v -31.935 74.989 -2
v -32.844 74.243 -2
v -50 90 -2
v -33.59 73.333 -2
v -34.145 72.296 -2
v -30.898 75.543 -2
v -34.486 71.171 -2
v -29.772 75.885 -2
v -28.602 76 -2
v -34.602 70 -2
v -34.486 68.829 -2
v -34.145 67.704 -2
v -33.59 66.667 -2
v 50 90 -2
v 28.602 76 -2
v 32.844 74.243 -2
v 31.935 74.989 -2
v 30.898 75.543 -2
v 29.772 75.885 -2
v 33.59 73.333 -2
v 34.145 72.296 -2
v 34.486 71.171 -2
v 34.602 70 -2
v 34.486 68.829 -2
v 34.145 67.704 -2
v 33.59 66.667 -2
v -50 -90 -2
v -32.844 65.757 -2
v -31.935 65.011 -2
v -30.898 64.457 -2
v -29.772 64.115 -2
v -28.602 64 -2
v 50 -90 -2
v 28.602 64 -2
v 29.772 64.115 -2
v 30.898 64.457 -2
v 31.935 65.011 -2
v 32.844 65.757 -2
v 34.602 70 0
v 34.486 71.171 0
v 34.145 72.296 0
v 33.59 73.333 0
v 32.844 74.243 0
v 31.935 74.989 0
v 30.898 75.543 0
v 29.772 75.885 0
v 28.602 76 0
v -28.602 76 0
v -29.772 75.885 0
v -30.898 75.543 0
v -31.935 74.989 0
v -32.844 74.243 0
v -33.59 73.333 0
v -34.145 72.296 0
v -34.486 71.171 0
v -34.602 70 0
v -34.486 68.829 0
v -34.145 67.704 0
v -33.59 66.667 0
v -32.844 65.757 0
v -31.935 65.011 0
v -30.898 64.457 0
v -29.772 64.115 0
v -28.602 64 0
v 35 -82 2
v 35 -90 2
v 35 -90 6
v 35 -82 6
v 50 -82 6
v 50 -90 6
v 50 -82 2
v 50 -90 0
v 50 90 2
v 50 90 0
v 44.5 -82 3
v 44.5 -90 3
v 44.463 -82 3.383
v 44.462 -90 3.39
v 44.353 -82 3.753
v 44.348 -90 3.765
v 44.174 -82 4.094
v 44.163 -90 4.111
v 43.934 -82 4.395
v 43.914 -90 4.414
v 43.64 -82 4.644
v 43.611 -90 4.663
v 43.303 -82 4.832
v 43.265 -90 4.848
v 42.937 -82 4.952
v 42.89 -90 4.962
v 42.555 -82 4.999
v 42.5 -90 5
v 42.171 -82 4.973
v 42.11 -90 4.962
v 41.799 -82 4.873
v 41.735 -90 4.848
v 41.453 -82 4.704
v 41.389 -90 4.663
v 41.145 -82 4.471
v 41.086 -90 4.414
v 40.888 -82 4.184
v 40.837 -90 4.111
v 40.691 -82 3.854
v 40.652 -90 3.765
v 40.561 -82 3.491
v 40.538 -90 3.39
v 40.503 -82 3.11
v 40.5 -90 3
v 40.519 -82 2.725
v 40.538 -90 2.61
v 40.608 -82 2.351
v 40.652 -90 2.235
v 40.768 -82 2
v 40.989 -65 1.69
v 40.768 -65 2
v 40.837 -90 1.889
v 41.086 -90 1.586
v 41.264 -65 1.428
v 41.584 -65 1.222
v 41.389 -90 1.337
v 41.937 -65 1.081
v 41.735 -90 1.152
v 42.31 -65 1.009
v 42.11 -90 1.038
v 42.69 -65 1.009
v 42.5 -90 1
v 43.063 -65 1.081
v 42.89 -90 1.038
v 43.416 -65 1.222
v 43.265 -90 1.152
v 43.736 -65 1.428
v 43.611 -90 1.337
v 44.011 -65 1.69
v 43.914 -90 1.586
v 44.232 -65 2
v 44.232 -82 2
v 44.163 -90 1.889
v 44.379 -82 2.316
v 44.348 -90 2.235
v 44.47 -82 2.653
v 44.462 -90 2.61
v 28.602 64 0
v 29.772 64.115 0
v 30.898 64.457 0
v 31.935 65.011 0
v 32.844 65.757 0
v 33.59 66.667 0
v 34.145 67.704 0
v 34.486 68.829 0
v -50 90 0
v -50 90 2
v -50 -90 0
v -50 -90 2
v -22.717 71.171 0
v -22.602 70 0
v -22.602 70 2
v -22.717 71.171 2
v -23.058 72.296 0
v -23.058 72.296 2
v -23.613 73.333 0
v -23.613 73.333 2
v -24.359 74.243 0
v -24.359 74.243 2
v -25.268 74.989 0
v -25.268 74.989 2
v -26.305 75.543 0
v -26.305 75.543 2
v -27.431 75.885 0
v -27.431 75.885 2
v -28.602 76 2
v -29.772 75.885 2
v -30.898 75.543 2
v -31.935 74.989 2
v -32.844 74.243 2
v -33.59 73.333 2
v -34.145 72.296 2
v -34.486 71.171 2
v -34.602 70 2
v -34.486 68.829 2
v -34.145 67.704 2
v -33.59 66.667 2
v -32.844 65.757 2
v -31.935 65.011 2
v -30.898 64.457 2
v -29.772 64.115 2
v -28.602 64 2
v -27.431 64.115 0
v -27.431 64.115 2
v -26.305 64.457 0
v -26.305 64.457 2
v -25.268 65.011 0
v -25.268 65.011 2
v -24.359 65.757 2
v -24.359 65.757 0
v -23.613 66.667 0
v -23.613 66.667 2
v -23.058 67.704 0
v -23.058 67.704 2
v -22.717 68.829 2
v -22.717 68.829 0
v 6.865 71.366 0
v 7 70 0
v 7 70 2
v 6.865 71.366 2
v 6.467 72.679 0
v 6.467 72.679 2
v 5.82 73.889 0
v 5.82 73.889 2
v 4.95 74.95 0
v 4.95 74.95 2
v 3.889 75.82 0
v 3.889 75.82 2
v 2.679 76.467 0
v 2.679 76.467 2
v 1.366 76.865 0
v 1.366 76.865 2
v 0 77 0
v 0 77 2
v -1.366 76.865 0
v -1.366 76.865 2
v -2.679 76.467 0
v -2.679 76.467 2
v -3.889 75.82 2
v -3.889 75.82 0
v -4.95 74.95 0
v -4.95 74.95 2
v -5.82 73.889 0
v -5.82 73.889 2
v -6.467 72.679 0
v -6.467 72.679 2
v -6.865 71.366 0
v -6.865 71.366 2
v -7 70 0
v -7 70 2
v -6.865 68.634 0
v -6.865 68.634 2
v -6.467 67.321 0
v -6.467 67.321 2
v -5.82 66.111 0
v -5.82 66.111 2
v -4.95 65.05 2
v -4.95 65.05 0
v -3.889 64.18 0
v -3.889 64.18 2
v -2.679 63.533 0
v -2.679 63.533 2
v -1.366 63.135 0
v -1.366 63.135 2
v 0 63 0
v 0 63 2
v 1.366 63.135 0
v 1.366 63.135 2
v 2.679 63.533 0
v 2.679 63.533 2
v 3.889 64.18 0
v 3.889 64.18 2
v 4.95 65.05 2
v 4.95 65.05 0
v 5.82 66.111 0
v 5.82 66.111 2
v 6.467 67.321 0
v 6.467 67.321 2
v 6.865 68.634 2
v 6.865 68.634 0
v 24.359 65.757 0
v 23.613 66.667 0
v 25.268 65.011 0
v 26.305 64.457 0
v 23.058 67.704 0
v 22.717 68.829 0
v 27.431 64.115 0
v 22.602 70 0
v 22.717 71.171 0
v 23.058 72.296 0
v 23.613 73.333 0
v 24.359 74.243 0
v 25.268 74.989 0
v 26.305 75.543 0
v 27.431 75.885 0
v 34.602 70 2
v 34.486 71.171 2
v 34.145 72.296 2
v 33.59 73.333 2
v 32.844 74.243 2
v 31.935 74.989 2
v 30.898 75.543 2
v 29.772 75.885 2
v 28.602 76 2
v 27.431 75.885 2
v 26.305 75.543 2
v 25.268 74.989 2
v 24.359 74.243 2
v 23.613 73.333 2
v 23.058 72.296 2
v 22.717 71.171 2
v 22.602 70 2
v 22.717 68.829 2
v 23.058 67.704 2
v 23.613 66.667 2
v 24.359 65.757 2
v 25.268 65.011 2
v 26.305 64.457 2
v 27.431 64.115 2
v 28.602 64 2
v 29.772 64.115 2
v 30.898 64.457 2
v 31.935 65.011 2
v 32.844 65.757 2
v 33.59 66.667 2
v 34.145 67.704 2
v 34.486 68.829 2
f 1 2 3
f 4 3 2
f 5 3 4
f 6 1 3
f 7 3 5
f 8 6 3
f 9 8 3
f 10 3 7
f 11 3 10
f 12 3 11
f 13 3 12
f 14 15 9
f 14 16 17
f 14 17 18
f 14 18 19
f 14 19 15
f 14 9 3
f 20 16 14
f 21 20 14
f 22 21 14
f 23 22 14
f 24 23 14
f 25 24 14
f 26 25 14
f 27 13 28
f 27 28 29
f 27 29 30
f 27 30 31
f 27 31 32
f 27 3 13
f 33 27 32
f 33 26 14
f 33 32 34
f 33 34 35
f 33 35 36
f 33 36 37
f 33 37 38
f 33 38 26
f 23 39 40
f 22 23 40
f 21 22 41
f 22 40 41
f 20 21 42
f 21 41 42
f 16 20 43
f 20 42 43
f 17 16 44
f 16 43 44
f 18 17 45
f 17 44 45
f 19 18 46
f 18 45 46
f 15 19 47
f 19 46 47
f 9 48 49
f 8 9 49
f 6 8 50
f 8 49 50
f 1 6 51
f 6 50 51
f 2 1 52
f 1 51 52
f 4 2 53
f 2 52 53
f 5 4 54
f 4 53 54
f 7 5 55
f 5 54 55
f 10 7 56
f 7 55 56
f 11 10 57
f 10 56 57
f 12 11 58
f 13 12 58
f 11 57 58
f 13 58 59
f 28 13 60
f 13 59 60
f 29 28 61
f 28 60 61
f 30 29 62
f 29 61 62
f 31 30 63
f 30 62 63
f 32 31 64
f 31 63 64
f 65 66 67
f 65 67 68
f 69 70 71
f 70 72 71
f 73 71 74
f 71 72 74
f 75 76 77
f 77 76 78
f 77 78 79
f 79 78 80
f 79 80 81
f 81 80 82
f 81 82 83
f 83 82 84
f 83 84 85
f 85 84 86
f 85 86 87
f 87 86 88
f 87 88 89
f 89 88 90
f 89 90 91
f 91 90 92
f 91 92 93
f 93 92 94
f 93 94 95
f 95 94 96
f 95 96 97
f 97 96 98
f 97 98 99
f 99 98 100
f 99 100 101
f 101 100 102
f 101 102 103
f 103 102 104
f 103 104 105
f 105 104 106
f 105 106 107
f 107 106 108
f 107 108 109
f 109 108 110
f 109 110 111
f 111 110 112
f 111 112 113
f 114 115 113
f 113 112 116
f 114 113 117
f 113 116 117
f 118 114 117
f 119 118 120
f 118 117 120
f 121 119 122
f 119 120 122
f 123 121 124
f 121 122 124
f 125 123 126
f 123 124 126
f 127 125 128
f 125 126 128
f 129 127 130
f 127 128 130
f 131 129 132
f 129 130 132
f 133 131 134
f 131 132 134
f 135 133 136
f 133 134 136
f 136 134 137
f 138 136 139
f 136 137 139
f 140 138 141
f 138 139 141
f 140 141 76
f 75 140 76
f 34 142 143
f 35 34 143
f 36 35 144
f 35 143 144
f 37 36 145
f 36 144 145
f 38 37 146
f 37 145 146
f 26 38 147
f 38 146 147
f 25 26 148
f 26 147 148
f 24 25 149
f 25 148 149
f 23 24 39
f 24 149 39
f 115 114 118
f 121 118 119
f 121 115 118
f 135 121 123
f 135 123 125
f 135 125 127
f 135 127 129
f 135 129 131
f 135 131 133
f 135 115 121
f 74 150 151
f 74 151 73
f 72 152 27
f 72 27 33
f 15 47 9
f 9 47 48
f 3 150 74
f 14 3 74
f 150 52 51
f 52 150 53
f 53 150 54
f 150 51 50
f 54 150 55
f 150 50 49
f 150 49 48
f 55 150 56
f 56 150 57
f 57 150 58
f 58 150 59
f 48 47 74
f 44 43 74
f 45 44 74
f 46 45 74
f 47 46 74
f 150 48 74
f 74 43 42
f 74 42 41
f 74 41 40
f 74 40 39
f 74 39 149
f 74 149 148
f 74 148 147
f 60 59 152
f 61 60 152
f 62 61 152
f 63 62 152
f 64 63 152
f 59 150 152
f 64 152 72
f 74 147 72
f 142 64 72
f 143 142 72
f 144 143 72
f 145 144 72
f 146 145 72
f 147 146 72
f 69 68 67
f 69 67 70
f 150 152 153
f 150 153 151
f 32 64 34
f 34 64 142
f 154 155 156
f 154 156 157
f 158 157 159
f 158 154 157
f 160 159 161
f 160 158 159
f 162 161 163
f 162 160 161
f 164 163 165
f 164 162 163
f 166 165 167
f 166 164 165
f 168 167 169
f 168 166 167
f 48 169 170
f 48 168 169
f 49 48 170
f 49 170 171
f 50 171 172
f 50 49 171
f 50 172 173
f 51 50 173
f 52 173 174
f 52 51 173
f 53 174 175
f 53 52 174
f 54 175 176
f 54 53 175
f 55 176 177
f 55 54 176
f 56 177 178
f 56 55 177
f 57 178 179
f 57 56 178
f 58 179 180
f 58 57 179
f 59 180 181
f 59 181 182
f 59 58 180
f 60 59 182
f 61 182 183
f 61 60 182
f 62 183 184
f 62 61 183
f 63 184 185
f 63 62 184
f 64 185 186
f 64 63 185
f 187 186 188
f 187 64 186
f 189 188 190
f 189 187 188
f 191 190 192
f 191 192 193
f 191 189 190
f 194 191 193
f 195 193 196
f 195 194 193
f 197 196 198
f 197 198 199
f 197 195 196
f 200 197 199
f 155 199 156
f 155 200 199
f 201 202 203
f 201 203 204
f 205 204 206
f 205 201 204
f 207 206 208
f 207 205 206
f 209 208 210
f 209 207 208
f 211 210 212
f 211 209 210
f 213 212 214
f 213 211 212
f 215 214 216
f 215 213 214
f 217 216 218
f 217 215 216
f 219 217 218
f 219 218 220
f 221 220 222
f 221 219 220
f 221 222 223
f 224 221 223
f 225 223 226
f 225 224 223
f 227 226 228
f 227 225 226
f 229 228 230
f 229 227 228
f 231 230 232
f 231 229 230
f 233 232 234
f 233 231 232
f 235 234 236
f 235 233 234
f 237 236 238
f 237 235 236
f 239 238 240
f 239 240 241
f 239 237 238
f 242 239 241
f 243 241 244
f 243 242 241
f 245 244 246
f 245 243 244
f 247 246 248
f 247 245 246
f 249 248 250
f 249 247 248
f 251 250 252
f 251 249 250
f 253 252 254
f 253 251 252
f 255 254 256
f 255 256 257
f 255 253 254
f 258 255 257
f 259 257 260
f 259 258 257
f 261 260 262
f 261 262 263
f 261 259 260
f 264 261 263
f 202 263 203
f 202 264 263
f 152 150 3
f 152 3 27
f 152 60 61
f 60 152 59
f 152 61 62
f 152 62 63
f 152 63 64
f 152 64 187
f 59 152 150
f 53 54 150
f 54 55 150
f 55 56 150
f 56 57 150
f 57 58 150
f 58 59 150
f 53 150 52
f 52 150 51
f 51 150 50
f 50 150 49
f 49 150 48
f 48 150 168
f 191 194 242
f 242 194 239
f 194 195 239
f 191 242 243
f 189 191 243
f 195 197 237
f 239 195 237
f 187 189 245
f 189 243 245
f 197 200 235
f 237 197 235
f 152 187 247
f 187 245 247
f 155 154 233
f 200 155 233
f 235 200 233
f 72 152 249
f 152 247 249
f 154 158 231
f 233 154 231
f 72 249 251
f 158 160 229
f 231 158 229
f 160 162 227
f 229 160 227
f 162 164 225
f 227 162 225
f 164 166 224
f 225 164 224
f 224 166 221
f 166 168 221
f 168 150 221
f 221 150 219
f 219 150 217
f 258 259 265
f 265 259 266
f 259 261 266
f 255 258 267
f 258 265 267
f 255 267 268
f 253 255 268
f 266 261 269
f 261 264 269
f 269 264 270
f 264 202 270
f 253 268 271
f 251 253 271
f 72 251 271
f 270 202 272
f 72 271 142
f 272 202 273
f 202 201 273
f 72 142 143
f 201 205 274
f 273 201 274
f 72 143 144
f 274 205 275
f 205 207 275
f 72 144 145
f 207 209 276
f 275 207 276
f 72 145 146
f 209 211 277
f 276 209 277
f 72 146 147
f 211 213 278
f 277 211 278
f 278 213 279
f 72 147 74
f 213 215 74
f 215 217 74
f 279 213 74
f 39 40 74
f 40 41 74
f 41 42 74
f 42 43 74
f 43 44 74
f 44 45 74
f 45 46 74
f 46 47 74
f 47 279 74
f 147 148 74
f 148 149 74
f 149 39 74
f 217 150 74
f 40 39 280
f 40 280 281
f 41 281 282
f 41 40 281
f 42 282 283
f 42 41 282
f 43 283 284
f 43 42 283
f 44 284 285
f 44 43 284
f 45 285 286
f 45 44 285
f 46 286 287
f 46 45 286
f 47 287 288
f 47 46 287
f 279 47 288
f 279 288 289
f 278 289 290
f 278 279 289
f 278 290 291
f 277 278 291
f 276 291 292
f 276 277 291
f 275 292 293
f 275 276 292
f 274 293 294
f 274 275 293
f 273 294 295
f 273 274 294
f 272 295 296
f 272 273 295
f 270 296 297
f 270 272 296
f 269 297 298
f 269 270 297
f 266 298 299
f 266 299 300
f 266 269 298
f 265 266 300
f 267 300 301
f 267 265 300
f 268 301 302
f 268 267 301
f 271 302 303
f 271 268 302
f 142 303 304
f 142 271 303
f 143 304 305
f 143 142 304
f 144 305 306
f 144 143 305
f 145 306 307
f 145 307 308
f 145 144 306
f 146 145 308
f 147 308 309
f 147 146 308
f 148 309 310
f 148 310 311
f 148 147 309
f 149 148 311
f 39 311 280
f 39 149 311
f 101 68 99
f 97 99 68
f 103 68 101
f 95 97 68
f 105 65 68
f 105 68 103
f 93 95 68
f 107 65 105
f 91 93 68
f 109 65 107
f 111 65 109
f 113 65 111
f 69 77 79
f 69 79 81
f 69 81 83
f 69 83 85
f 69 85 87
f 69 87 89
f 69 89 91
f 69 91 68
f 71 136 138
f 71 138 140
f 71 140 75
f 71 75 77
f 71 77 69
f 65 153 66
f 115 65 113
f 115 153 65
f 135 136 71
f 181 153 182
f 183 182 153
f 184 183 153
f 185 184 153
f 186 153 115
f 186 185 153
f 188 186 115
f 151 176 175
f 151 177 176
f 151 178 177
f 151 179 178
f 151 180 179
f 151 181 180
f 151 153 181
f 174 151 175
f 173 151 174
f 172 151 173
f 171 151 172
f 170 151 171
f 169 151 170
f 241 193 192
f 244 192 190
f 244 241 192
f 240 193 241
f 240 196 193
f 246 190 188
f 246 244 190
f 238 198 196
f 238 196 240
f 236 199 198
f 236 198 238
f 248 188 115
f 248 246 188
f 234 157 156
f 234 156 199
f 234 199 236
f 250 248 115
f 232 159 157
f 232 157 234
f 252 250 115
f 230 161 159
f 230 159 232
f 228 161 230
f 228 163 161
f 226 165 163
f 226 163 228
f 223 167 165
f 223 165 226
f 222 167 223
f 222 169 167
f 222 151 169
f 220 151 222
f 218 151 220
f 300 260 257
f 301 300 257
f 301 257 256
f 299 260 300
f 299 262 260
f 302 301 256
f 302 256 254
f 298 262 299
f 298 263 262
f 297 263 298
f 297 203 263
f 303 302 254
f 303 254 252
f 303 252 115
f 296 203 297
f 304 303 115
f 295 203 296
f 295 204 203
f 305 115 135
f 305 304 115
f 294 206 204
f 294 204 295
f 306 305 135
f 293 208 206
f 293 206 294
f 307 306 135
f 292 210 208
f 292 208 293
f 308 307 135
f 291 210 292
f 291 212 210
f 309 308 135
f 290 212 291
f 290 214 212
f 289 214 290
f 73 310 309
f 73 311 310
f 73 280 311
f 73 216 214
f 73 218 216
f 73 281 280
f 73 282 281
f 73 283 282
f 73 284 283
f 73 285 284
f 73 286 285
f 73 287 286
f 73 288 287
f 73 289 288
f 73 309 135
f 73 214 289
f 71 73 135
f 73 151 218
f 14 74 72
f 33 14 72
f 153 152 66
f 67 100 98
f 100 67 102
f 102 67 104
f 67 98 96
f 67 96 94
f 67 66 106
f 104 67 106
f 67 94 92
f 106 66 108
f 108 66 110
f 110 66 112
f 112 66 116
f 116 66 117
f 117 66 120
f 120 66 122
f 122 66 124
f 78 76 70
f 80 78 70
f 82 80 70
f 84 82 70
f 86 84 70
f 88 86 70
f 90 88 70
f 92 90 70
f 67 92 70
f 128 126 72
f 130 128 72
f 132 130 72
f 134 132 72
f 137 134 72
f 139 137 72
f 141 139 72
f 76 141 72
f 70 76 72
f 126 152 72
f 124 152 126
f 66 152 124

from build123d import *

# Parameters (mm, degrees)
F0_W     = 100
F0_H     = 180
F0_R     = 6
F0_R_2   = 7
F1_DEPTH = 2
F2_W     = 100
F2_H     = 180
F3_DEPTH = 2
F4_W     = 15
F4_H     = 8
F5_DEPTH = 4
F6_R     = 2
F7_DEPTH = 25


with BuildPart() as f1:
    # F0 (on Top) → F1 (new body)
    with BuildSketch(Plane.XY):
        Rectangle(F0_W, F0_H)
        with Locations((-28.601566, 70)):
            Circle(F0_R, mode=Mode.SUBTRACT)
        with Locations((0, 70)):
            Circle(F0_R_2, mode=Mode.SUBTRACT)
        with Locations((28.601566, 70)):
            Circle(F0_R, mode=Mode.SUBTRACT)
    extrude(amount=F1_DEPTH)

    # F4 (on face) → F5 (join)
    with BuildSketch(Plane.XY.offset(2)):
        with Locations((42.5, -86)):
            Rectangle(F4_W, F4_H)
    extrude(amount=F5_DEPTH)

    # F6 (on face) → F7 (cut)
    with BuildSketch(Plane.XZ.offset(90)):
        with Locations((42.5, 3)):
            Circle(F6_R)
    extrude(amount=-F7_DEPTH, mode=Mode.SUBTRACT)


with BuildPart() as f3:
    # F2 (on face) → F3 (new body)
    with BuildSketch(Plane(origin=(0, 0, 0), x_dir=(1, 0, 0), z_dir=(0, 0, -1))):
        Rectangle(F2_W, F2_H)
        with BuildLine():
            ThreePointArc((-28.601566, -76), (-34.601566, -70), (-28.601566, -64))
            Line((-28.601566, -64), (28.601566, -64))
            ThreePointArc((28.601566, -64), (32.844207, -65.757359), (34.601566, -70))
            ThreePointArc((34.601566, -70), (32.844207, -74.242641), (28.601566, -76))
            Line((28.601566, -76), (-28.601566, -76))
        make_face(mode=Mode.SUBTRACT)
    extrude(amount=F3_DEPTH)


solid = Compound([f1.part, f3.part])
